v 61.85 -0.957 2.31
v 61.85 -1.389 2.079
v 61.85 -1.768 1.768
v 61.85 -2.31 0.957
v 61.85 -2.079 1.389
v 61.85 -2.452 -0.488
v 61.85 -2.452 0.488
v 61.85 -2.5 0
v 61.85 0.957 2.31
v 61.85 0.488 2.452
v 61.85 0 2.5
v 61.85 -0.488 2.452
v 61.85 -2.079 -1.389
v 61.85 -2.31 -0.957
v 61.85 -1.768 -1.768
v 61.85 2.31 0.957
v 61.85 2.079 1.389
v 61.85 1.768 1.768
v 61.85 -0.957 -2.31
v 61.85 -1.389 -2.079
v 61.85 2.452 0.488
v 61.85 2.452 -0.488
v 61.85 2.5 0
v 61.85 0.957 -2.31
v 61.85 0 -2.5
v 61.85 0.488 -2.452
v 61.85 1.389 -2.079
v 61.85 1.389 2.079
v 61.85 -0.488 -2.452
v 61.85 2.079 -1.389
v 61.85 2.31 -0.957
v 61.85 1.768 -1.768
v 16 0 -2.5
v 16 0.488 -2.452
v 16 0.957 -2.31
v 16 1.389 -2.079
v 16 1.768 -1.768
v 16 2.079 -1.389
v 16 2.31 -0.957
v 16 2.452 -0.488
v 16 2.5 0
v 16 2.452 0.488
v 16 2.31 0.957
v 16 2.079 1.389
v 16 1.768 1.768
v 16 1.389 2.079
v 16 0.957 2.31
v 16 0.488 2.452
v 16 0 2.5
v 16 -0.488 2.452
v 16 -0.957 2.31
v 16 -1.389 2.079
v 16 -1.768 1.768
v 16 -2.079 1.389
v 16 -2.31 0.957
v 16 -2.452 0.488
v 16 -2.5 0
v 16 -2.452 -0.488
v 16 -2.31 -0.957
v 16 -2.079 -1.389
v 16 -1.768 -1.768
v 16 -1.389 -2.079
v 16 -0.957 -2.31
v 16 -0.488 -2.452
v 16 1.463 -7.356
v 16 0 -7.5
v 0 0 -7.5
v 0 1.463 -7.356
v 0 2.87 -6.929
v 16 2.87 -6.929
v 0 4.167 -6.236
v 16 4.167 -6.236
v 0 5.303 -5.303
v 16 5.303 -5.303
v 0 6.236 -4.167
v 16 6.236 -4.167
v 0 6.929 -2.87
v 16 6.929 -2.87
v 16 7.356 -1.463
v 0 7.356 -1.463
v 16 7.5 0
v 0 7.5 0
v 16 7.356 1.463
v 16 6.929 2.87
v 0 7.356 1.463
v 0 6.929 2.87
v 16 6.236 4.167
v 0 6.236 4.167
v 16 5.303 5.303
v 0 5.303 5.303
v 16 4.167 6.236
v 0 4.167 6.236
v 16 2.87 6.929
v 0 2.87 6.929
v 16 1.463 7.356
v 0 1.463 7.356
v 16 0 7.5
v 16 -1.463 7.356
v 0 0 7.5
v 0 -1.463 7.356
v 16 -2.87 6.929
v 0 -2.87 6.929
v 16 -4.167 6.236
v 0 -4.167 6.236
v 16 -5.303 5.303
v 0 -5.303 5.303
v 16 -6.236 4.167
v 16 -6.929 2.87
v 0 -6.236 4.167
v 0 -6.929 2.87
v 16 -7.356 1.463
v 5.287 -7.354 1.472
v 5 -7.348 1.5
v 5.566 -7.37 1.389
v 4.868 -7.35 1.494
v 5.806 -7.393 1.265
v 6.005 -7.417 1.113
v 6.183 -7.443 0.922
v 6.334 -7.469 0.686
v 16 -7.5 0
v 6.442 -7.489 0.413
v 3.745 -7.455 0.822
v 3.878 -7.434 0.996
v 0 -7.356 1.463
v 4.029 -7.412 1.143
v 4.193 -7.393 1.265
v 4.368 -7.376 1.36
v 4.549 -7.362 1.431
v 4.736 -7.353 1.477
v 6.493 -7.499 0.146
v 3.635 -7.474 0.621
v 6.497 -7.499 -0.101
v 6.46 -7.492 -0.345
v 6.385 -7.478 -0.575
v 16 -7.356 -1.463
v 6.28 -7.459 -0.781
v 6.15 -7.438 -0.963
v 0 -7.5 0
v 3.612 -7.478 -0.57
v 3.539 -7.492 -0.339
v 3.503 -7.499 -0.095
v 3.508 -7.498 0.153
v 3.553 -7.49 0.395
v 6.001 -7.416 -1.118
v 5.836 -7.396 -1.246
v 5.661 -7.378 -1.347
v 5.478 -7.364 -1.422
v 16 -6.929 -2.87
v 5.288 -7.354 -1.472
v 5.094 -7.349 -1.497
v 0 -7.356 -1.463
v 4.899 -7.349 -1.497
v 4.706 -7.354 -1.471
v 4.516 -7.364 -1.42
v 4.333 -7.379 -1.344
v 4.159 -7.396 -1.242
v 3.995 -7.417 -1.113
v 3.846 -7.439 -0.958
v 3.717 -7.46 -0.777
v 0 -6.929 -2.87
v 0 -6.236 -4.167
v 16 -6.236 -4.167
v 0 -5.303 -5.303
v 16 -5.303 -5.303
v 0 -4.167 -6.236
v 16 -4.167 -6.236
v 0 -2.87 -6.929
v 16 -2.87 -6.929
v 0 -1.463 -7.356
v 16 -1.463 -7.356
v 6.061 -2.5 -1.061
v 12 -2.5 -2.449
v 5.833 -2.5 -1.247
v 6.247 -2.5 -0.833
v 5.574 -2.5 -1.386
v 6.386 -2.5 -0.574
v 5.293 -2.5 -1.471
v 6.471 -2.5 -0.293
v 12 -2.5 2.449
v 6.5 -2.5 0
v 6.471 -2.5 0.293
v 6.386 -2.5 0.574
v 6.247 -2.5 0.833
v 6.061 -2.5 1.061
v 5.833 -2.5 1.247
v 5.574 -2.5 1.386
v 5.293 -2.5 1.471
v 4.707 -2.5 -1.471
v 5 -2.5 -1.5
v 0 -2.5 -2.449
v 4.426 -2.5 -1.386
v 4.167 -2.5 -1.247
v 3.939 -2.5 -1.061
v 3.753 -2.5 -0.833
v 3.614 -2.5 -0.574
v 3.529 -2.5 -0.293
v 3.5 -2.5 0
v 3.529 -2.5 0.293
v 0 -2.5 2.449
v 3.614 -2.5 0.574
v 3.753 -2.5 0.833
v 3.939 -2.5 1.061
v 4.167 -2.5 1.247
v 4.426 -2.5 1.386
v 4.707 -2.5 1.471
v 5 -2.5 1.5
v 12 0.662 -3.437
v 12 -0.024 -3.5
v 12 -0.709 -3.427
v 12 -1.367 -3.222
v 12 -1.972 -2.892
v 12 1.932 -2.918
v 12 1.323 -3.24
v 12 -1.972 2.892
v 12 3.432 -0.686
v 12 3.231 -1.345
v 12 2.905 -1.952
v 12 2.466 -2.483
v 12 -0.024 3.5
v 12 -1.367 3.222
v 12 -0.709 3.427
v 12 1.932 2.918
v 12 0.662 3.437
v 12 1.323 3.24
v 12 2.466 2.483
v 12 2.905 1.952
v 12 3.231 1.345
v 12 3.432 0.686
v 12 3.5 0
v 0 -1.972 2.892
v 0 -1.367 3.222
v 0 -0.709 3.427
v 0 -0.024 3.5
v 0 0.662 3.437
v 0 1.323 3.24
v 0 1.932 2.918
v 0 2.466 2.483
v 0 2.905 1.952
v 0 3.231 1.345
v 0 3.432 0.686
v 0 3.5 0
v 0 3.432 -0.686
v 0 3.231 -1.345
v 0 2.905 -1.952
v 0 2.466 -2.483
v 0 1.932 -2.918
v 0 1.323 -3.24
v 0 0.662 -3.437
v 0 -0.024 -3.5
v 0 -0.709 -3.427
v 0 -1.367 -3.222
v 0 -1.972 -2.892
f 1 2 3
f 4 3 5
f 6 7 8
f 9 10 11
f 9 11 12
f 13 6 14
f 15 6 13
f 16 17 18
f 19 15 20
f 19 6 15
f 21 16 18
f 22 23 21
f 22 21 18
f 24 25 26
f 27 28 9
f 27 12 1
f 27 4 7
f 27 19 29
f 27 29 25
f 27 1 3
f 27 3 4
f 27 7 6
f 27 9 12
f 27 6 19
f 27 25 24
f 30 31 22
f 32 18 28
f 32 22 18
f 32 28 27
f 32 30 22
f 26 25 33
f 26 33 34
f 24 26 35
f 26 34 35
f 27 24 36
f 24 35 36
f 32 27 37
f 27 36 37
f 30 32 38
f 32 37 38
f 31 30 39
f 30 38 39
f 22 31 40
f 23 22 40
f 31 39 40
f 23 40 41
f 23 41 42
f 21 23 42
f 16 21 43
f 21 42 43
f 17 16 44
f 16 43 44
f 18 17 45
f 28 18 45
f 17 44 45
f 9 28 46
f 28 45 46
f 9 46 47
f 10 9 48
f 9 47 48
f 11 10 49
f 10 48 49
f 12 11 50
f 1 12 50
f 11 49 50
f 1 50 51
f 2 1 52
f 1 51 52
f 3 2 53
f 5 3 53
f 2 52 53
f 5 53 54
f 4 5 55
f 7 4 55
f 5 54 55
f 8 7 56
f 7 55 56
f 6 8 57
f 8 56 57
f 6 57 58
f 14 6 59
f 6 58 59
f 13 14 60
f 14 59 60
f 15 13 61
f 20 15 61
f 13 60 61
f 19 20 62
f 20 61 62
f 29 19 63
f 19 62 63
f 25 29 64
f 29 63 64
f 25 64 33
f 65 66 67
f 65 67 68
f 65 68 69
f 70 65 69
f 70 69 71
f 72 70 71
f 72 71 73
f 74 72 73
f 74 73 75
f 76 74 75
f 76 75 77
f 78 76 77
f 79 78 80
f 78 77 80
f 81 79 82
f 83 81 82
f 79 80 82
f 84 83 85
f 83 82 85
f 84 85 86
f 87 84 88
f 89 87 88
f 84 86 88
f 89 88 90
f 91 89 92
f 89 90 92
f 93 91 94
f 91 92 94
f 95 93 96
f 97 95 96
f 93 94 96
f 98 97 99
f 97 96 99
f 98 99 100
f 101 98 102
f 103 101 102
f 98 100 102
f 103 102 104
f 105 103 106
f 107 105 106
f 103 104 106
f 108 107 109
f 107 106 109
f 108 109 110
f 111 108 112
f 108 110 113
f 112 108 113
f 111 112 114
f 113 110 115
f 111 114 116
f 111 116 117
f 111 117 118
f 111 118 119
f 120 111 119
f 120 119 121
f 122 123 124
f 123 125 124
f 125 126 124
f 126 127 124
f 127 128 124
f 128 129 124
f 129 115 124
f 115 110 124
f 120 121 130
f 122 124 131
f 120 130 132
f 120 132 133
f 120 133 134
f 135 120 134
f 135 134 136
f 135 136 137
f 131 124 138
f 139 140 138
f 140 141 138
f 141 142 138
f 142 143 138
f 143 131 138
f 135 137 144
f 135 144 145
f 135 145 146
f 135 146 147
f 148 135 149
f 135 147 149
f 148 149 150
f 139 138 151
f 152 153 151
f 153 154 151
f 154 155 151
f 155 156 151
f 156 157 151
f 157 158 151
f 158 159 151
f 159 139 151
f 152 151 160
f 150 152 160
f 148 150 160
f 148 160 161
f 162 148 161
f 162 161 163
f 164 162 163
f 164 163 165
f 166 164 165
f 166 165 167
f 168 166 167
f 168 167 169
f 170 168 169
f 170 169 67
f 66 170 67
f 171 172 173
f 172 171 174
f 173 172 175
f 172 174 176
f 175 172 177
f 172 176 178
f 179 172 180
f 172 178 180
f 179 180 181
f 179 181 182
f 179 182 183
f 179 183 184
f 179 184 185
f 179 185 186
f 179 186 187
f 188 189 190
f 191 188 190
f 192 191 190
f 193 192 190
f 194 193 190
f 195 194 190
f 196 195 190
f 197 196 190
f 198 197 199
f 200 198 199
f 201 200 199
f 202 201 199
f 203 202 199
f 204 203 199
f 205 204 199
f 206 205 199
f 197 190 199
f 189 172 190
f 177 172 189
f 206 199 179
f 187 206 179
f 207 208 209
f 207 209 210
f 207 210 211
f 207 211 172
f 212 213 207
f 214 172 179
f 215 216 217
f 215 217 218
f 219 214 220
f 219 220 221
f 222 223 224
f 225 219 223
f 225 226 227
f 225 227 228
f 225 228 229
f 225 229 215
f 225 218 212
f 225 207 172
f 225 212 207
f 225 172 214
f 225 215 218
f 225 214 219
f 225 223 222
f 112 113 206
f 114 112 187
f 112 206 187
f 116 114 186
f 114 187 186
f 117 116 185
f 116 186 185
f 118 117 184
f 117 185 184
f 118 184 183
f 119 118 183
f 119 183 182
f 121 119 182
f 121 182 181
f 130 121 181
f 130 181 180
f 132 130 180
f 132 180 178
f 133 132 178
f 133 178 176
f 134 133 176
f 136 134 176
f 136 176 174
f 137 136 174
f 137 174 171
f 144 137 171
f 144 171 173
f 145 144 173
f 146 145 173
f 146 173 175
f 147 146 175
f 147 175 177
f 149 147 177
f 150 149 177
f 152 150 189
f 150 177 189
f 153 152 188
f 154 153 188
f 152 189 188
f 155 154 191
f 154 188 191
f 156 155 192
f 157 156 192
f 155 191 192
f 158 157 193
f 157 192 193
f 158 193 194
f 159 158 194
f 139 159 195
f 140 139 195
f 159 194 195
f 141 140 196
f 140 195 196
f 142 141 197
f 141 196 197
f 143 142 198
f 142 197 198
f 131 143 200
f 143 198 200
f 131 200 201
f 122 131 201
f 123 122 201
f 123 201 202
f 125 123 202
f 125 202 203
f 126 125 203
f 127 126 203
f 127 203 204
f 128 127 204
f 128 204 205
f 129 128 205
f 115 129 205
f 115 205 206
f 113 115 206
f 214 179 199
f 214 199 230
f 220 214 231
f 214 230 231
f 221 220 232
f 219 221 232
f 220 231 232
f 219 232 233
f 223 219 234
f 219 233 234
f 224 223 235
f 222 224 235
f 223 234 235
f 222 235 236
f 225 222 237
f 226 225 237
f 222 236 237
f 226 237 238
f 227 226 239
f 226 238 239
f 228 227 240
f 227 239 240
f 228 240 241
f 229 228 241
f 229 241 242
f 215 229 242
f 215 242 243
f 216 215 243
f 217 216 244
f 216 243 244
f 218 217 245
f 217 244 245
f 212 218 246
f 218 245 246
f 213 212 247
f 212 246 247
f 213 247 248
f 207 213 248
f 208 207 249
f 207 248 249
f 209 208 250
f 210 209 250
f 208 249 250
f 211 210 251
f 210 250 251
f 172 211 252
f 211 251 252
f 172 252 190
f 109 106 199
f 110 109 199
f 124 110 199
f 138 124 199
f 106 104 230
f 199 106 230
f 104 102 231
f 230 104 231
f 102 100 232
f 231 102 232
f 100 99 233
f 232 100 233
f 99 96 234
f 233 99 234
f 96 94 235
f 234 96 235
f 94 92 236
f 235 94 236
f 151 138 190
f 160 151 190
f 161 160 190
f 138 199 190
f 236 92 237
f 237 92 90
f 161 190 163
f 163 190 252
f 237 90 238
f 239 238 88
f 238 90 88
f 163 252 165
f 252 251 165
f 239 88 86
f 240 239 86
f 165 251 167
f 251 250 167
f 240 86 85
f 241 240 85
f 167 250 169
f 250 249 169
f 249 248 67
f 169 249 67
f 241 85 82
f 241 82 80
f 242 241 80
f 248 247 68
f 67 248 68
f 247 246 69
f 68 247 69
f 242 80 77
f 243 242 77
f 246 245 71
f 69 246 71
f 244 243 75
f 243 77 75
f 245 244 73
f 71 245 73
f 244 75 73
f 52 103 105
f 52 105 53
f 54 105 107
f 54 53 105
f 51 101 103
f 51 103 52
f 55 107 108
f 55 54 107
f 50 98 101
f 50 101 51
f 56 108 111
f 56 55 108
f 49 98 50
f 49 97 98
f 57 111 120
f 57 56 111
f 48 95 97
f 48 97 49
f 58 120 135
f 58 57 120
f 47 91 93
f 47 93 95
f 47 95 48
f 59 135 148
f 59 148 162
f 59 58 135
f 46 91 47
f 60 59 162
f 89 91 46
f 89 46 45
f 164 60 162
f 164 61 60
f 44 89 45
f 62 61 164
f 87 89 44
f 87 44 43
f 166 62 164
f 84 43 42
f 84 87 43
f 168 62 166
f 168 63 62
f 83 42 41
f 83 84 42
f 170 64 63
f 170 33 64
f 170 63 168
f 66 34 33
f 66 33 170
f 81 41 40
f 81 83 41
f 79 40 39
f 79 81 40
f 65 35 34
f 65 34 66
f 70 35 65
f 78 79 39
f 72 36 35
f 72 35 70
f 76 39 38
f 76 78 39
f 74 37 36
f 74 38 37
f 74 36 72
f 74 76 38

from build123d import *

# Parameters (mm, degrees)
SKETCH1_R               = 7.5
BOSS_EXTRUDE1_DEPTH     = 16
SKETCH2_R               = 2.5
BOSS_EXTRUDE2_DEPTH     = 45.85
CUT_EXTRUDE1_DEPTH      = 12
CUT_EXTRUDE2_REACH      = 65.1
CUT_EXTRUDE2_END_RADIUS = 7.5
SKETCH4_R               = 1.5


with BuildPart() as part:
    # Sketch1 → Boss-Extrude1 (new body)
    with BuildSketch(Plane(origin=(0, 0, 0), x_dir=(0, 0, -1), z_dir=(1, 0, 0))):
        Circle(SKETCH1_R)
    extrude(amount=BOSS_EXTRUDE1_DEPTH)

    # Sketch2 → Boss-Extrude2 (add)
    with BuildSketch(Plane(origin=(16, 0, 0), x_dir=(0, 0, -1), z_dir=(1, 0, 0))):
        Circle(SKETCH2_R)
    extrude(amount=BOSS_EXTRUDE2_DEPTH)

    # Sketch3 → Cut-Extrude1 (cut)
    with BuildSketch(Plane.ZY):
        with BuildLine():
            Line((-2.449489743, -2.5), (2.449489743, -2.5))
            ThreePointArc((2.449489743, -2.5), (0, 3.5), (-2.449489743, -2.5))
        make_face()
    extrude(amount=-CUT_EXTRUDE1_DEPTH, mode=Mode.SUBTRACT)

    # Cut-Extrude2: up to this cylinder (the profile starts inside it)
    cut_extrude2_end = Plane(origin=(5, 0, 0), z_dir=(-1, 0, 0)) * Cylinder(CUT_EXTRUDE2_END_RADIUS, 146.2, mode=Mode.PRIVATE)
    # Sketch4 → Cut-Extrude2 (cut, up to the surface)
    with BuildSketch(Plane(origin=(0, -2.5, 0), x_dir=(1, 0, 0), z_dir=(0, 1, 0)), mode=Mode.PRIVATE) as cut_extrude2_sk1:
        with Locations(Location((5, 0, 0), (0, 0, 270))):
            Circle(SKETCH4_R)
    cut_extrude2_tool1 = extrude(cut_extrude2_sk1.sketch, amount=-CUT_EXTRUDE2_REACH, mode=Mode.PRIVATE) & cut_extrude2_end
    add(cut_extrude2_tool1.solids().sort_by_distance((5, -2.5, 0))[0], mode=Mode.SUBTRACT)


solid = part.part
